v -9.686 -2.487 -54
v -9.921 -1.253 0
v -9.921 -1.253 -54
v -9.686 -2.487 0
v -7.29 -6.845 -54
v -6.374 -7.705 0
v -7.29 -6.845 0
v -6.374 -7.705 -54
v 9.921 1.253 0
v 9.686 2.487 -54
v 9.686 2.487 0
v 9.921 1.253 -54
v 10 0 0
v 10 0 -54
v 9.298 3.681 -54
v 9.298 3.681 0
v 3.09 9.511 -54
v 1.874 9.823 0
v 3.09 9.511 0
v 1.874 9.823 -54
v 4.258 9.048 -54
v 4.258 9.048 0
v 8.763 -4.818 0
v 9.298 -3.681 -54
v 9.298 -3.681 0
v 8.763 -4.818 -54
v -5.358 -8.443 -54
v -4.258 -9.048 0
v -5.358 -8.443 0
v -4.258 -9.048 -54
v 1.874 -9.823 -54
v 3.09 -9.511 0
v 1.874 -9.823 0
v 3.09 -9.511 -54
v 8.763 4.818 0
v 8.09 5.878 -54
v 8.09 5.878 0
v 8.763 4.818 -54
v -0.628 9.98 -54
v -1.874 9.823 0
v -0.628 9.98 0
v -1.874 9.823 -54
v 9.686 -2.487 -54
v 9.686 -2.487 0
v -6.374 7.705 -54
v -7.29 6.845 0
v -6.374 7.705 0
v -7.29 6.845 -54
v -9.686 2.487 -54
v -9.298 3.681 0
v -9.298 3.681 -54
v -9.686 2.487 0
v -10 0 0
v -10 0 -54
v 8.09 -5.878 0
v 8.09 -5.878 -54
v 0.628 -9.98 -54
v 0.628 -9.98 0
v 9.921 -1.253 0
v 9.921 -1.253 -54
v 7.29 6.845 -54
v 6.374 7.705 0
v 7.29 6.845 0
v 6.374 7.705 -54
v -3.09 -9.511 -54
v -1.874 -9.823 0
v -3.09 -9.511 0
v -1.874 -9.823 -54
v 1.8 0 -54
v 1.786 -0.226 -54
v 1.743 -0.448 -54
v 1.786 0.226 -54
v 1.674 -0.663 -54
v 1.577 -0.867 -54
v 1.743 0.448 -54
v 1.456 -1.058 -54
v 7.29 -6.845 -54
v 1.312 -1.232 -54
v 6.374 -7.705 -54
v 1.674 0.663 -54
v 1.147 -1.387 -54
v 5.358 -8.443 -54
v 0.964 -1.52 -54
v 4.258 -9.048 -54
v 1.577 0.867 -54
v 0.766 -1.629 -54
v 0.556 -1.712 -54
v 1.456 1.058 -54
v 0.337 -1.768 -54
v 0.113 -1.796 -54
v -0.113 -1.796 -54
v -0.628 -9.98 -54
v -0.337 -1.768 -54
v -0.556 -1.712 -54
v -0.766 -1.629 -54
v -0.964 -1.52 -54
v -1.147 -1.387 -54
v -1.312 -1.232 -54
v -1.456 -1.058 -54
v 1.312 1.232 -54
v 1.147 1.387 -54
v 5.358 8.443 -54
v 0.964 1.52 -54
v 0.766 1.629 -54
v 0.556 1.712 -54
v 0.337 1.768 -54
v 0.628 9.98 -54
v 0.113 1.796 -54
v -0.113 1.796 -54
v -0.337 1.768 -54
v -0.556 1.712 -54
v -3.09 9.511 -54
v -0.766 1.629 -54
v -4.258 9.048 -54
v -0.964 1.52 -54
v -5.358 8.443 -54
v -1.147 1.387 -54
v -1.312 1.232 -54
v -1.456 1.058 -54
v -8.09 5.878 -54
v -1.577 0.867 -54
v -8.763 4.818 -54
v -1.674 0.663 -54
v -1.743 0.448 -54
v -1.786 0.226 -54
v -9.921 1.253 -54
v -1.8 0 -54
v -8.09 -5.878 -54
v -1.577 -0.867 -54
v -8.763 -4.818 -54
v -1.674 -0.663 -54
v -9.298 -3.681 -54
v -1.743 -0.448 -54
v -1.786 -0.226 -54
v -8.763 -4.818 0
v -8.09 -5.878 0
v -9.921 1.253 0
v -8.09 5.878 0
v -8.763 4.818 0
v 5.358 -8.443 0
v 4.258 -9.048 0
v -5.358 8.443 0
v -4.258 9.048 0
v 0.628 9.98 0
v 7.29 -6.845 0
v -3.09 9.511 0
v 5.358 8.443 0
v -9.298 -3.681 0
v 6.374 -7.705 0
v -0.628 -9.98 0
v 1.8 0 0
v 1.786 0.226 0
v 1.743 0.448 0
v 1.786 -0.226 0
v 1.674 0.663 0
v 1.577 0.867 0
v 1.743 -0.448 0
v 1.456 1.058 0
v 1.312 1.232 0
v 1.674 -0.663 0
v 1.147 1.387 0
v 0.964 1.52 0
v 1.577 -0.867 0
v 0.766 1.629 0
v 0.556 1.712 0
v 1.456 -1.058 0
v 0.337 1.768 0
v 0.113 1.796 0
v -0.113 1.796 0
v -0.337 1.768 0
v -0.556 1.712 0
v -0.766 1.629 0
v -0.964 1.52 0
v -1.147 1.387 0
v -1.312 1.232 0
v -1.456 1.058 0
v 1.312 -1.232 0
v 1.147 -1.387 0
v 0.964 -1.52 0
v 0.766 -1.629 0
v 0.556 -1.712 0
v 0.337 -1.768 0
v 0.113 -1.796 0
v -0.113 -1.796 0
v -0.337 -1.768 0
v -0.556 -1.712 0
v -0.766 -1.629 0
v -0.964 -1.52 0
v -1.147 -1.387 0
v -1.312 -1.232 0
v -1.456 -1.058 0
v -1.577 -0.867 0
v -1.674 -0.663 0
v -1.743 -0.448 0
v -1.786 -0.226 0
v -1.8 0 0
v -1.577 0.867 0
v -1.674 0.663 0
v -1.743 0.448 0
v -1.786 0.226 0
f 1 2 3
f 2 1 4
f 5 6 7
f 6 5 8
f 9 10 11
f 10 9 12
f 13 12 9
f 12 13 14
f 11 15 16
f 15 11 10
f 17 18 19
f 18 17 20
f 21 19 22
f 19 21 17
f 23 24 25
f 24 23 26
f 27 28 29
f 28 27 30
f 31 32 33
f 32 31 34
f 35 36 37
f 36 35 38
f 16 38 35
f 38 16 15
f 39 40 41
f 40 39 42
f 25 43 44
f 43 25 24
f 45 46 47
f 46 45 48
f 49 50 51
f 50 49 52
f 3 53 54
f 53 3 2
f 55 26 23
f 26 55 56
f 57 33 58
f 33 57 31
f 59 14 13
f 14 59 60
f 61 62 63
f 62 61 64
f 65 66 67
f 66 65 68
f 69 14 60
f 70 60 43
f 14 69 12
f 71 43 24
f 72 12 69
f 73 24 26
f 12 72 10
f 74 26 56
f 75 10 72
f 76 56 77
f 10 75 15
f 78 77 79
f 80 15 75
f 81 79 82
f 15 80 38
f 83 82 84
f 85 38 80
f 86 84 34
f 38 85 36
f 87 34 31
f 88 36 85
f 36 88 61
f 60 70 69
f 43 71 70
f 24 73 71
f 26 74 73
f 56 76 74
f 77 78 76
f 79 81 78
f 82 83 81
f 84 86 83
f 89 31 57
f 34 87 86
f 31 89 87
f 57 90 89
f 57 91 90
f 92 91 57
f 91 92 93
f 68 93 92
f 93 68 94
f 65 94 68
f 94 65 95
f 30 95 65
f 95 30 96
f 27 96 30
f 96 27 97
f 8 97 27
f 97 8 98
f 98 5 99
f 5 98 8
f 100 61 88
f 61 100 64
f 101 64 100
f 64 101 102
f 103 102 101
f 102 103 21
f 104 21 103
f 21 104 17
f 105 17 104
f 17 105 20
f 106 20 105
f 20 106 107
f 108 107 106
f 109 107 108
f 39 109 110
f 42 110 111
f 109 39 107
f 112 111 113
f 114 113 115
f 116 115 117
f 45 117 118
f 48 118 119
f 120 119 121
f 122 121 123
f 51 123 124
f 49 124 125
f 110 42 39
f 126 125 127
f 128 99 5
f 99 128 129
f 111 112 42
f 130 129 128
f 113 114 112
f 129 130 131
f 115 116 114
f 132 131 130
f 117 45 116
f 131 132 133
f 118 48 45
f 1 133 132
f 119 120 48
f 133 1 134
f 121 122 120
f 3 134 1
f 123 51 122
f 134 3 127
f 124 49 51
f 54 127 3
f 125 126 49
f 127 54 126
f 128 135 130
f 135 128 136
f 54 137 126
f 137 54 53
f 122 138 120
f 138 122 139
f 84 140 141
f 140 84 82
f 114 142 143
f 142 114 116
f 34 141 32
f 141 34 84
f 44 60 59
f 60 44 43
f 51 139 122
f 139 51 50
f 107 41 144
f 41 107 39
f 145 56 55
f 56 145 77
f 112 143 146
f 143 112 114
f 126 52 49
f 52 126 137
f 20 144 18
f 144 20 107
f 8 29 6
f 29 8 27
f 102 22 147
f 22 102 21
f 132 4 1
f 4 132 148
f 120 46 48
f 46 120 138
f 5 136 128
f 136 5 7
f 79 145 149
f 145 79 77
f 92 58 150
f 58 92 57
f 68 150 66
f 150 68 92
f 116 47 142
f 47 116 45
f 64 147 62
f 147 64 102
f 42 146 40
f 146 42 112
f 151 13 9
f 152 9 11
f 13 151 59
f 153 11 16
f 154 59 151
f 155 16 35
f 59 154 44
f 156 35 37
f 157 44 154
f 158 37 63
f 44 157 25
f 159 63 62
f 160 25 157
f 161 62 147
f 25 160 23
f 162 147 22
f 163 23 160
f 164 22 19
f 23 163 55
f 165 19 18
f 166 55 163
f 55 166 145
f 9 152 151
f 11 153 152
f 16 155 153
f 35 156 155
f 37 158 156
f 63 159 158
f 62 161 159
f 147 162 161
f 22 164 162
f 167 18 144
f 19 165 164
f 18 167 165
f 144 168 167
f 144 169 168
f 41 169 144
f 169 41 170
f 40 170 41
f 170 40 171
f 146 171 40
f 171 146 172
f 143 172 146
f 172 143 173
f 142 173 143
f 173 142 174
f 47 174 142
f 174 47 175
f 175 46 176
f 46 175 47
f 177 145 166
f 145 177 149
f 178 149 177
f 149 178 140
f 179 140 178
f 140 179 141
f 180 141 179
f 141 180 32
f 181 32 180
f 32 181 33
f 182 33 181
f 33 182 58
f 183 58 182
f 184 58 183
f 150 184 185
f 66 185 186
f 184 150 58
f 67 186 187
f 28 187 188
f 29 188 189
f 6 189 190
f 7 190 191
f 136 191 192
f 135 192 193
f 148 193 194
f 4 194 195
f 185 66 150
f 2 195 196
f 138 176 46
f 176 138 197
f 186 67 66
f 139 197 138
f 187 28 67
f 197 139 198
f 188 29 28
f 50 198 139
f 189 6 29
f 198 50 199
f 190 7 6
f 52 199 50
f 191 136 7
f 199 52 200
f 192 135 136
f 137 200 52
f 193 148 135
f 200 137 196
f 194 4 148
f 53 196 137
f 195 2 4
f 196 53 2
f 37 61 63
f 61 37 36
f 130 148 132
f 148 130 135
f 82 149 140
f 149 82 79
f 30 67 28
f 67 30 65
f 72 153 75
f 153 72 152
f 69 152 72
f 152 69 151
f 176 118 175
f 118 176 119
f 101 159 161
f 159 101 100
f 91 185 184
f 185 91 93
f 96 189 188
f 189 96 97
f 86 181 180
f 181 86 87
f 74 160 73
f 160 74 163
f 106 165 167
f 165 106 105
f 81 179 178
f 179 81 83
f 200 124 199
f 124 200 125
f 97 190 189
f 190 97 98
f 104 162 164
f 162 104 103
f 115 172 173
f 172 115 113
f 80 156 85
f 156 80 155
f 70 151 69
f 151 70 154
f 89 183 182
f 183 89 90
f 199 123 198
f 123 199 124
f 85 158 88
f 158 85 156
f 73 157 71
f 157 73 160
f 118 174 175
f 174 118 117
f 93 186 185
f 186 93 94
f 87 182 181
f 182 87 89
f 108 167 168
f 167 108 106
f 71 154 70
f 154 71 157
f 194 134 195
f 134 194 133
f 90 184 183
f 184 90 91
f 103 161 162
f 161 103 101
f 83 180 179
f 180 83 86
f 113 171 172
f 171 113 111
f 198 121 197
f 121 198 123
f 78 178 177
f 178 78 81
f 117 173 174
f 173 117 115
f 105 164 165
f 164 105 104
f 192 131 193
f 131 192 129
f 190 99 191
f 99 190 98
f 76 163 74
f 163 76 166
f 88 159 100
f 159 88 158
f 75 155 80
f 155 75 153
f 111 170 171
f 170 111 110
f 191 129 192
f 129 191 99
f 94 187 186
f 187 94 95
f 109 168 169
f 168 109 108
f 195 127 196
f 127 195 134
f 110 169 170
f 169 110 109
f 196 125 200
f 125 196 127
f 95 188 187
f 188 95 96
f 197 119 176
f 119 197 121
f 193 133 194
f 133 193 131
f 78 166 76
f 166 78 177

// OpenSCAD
$fn = 50;


difference() {
	union() {
		translate(v = [0, 0, -54.0000000000]) {
			cylinder(h = 54, r = 10.0000000000);
		}
		cylinder(h = 0, r = 16.0000000000);
	}
	union() {
		#translate(v = [0, 0, -54]) {
			cylinder(h = 54, r = 1.8000000000);
		}
	}
}
